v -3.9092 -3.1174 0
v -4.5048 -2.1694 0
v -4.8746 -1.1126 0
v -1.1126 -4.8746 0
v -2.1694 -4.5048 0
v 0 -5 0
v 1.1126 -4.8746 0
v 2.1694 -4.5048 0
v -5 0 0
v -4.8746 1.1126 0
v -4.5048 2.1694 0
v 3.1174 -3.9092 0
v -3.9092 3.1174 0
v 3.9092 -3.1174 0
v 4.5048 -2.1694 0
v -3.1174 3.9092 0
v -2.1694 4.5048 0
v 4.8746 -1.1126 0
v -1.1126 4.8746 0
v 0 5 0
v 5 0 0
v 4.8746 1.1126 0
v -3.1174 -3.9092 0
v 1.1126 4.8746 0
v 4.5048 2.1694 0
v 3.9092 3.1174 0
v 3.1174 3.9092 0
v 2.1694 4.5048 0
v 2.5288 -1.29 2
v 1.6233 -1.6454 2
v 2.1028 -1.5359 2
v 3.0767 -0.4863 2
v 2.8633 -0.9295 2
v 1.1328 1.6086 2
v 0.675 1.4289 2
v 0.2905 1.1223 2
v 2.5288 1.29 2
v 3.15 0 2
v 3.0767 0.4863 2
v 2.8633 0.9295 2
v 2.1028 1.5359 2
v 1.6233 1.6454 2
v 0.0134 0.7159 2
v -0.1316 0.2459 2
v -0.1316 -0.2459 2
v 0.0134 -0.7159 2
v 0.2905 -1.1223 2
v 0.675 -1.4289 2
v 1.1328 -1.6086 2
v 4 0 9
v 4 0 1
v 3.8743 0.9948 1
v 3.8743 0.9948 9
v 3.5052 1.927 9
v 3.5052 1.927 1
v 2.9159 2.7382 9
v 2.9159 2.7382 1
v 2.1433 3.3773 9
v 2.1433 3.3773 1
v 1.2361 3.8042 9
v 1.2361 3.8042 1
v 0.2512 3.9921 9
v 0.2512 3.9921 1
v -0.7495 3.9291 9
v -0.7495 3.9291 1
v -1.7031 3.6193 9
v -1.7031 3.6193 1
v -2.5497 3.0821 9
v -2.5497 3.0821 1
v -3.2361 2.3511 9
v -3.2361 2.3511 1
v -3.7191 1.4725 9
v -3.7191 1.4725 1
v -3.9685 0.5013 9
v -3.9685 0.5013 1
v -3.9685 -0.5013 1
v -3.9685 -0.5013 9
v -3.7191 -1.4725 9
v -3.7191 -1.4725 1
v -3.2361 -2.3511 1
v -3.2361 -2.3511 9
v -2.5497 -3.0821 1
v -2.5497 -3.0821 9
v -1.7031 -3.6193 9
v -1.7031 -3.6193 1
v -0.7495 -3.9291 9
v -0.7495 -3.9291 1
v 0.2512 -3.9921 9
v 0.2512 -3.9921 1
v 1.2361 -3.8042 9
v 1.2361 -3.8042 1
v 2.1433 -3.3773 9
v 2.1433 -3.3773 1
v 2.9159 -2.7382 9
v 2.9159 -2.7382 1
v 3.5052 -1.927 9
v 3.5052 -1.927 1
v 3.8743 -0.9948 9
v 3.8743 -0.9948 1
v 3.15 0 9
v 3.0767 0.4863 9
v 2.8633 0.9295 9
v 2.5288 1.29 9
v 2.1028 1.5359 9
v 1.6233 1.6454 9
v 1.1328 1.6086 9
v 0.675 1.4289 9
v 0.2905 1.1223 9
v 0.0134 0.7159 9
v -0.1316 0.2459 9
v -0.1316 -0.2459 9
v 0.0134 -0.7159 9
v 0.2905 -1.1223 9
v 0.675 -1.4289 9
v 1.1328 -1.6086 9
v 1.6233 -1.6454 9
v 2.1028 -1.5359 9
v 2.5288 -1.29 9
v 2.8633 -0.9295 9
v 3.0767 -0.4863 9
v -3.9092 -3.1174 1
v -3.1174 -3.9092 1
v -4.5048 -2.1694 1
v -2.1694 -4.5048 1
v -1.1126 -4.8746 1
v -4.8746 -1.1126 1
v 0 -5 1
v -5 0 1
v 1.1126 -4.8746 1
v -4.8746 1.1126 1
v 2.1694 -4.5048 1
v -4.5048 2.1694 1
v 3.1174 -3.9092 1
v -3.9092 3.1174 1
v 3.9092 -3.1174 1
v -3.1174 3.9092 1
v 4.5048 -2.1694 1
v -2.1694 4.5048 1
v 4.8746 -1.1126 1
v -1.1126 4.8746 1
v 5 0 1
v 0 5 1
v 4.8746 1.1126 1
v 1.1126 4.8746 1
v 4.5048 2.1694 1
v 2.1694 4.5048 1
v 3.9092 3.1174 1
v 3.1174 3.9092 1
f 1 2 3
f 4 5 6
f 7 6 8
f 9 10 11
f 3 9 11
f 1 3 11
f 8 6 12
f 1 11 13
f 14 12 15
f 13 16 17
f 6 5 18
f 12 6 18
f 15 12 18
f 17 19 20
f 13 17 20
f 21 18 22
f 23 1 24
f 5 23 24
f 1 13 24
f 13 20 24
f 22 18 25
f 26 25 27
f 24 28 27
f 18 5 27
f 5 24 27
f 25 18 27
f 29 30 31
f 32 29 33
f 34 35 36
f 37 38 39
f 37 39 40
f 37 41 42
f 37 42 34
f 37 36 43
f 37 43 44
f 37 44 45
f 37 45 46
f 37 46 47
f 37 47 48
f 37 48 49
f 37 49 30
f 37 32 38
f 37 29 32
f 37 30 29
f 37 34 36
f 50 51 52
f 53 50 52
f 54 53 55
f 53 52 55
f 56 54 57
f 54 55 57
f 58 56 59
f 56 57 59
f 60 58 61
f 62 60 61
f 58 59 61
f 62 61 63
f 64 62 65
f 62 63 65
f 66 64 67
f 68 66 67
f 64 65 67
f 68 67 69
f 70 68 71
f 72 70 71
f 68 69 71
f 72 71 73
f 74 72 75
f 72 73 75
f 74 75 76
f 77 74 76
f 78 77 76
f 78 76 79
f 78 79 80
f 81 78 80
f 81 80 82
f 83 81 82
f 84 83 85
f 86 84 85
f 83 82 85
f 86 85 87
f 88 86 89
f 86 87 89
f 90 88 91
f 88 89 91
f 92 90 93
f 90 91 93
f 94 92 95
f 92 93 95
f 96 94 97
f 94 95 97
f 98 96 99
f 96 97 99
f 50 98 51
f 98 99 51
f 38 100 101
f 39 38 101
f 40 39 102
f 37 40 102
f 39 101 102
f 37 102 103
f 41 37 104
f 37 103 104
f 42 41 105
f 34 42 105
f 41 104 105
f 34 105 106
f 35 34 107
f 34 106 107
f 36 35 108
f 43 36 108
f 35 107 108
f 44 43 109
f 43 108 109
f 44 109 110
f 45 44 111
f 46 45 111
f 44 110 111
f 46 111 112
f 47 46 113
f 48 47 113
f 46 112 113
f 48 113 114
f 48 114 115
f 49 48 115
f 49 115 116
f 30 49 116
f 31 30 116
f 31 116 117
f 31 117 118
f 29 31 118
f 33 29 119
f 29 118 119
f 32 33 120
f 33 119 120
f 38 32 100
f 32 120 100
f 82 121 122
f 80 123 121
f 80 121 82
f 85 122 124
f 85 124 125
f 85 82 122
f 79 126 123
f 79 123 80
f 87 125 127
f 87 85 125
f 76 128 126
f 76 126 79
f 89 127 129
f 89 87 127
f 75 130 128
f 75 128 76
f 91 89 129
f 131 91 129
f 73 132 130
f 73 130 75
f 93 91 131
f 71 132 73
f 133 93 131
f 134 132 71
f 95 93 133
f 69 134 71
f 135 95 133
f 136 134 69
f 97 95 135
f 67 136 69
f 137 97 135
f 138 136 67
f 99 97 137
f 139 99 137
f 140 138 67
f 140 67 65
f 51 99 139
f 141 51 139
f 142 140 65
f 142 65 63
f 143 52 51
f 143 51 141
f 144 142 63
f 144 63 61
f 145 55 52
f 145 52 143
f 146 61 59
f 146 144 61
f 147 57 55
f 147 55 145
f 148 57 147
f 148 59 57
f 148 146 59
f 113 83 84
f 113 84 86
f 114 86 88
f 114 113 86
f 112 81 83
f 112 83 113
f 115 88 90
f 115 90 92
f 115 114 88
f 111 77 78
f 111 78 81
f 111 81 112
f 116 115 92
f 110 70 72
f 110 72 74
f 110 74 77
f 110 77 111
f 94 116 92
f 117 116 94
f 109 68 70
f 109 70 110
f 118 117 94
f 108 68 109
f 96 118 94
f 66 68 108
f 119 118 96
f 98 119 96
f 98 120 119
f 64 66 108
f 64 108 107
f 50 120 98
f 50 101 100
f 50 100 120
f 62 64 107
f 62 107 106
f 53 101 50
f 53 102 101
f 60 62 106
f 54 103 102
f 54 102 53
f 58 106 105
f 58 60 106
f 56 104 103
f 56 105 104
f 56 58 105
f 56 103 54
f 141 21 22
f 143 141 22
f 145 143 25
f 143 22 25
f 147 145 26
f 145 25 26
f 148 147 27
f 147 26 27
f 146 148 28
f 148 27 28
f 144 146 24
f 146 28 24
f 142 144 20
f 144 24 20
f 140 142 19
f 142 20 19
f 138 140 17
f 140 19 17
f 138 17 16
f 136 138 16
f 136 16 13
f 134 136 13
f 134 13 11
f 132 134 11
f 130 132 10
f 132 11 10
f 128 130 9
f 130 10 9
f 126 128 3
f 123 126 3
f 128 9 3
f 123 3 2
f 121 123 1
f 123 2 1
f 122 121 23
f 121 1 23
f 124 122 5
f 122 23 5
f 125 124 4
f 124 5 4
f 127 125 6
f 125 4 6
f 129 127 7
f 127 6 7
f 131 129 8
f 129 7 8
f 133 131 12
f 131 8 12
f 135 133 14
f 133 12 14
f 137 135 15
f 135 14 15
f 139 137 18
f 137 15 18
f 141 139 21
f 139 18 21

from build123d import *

# Parameters (mm, degrees)
ESQUISSE1_R             = 5
BOSS_EXTRU_1_DEPTH      = 1
ESQUISSE2_R             = 4
BOSS_EXTRU_2_DEPTH      = 8
ESQUISSE3_R             = 1.65
ENL_V_MAT_EXTRU_1_DEPTH = 7


with BuildPart() as part:
    # Esquisse1 → Boss.-Extru.1 (new body)
    with BuildSketch(Plane.XY):
        Circle(ESQUISSE1_R)
    extrude(amount=BOSS_EXTRU_1_DEPTH)

    # Esquisse2 → Boss.-Extru.2 (add)
    with BuildSketch(Plane.XY.offset(1)):
        Circle(ESQUISSE2_R)
    extrude(amount=BOSS_EXTRU_2_DEPTH)

    # Esquisse3 → Enlèv. mat.-Extru.1 (cut)
    with BuildSketch(Plane.XY.offset(9)):
        with Locations((1.5, 0)):
            Circle(ESQUISSE3_R)
    extrude(amount=-ENL_V_MAT_EXTRU_1_DEPTH, mode=Mode.SUBTRACT)


solid = part.part
